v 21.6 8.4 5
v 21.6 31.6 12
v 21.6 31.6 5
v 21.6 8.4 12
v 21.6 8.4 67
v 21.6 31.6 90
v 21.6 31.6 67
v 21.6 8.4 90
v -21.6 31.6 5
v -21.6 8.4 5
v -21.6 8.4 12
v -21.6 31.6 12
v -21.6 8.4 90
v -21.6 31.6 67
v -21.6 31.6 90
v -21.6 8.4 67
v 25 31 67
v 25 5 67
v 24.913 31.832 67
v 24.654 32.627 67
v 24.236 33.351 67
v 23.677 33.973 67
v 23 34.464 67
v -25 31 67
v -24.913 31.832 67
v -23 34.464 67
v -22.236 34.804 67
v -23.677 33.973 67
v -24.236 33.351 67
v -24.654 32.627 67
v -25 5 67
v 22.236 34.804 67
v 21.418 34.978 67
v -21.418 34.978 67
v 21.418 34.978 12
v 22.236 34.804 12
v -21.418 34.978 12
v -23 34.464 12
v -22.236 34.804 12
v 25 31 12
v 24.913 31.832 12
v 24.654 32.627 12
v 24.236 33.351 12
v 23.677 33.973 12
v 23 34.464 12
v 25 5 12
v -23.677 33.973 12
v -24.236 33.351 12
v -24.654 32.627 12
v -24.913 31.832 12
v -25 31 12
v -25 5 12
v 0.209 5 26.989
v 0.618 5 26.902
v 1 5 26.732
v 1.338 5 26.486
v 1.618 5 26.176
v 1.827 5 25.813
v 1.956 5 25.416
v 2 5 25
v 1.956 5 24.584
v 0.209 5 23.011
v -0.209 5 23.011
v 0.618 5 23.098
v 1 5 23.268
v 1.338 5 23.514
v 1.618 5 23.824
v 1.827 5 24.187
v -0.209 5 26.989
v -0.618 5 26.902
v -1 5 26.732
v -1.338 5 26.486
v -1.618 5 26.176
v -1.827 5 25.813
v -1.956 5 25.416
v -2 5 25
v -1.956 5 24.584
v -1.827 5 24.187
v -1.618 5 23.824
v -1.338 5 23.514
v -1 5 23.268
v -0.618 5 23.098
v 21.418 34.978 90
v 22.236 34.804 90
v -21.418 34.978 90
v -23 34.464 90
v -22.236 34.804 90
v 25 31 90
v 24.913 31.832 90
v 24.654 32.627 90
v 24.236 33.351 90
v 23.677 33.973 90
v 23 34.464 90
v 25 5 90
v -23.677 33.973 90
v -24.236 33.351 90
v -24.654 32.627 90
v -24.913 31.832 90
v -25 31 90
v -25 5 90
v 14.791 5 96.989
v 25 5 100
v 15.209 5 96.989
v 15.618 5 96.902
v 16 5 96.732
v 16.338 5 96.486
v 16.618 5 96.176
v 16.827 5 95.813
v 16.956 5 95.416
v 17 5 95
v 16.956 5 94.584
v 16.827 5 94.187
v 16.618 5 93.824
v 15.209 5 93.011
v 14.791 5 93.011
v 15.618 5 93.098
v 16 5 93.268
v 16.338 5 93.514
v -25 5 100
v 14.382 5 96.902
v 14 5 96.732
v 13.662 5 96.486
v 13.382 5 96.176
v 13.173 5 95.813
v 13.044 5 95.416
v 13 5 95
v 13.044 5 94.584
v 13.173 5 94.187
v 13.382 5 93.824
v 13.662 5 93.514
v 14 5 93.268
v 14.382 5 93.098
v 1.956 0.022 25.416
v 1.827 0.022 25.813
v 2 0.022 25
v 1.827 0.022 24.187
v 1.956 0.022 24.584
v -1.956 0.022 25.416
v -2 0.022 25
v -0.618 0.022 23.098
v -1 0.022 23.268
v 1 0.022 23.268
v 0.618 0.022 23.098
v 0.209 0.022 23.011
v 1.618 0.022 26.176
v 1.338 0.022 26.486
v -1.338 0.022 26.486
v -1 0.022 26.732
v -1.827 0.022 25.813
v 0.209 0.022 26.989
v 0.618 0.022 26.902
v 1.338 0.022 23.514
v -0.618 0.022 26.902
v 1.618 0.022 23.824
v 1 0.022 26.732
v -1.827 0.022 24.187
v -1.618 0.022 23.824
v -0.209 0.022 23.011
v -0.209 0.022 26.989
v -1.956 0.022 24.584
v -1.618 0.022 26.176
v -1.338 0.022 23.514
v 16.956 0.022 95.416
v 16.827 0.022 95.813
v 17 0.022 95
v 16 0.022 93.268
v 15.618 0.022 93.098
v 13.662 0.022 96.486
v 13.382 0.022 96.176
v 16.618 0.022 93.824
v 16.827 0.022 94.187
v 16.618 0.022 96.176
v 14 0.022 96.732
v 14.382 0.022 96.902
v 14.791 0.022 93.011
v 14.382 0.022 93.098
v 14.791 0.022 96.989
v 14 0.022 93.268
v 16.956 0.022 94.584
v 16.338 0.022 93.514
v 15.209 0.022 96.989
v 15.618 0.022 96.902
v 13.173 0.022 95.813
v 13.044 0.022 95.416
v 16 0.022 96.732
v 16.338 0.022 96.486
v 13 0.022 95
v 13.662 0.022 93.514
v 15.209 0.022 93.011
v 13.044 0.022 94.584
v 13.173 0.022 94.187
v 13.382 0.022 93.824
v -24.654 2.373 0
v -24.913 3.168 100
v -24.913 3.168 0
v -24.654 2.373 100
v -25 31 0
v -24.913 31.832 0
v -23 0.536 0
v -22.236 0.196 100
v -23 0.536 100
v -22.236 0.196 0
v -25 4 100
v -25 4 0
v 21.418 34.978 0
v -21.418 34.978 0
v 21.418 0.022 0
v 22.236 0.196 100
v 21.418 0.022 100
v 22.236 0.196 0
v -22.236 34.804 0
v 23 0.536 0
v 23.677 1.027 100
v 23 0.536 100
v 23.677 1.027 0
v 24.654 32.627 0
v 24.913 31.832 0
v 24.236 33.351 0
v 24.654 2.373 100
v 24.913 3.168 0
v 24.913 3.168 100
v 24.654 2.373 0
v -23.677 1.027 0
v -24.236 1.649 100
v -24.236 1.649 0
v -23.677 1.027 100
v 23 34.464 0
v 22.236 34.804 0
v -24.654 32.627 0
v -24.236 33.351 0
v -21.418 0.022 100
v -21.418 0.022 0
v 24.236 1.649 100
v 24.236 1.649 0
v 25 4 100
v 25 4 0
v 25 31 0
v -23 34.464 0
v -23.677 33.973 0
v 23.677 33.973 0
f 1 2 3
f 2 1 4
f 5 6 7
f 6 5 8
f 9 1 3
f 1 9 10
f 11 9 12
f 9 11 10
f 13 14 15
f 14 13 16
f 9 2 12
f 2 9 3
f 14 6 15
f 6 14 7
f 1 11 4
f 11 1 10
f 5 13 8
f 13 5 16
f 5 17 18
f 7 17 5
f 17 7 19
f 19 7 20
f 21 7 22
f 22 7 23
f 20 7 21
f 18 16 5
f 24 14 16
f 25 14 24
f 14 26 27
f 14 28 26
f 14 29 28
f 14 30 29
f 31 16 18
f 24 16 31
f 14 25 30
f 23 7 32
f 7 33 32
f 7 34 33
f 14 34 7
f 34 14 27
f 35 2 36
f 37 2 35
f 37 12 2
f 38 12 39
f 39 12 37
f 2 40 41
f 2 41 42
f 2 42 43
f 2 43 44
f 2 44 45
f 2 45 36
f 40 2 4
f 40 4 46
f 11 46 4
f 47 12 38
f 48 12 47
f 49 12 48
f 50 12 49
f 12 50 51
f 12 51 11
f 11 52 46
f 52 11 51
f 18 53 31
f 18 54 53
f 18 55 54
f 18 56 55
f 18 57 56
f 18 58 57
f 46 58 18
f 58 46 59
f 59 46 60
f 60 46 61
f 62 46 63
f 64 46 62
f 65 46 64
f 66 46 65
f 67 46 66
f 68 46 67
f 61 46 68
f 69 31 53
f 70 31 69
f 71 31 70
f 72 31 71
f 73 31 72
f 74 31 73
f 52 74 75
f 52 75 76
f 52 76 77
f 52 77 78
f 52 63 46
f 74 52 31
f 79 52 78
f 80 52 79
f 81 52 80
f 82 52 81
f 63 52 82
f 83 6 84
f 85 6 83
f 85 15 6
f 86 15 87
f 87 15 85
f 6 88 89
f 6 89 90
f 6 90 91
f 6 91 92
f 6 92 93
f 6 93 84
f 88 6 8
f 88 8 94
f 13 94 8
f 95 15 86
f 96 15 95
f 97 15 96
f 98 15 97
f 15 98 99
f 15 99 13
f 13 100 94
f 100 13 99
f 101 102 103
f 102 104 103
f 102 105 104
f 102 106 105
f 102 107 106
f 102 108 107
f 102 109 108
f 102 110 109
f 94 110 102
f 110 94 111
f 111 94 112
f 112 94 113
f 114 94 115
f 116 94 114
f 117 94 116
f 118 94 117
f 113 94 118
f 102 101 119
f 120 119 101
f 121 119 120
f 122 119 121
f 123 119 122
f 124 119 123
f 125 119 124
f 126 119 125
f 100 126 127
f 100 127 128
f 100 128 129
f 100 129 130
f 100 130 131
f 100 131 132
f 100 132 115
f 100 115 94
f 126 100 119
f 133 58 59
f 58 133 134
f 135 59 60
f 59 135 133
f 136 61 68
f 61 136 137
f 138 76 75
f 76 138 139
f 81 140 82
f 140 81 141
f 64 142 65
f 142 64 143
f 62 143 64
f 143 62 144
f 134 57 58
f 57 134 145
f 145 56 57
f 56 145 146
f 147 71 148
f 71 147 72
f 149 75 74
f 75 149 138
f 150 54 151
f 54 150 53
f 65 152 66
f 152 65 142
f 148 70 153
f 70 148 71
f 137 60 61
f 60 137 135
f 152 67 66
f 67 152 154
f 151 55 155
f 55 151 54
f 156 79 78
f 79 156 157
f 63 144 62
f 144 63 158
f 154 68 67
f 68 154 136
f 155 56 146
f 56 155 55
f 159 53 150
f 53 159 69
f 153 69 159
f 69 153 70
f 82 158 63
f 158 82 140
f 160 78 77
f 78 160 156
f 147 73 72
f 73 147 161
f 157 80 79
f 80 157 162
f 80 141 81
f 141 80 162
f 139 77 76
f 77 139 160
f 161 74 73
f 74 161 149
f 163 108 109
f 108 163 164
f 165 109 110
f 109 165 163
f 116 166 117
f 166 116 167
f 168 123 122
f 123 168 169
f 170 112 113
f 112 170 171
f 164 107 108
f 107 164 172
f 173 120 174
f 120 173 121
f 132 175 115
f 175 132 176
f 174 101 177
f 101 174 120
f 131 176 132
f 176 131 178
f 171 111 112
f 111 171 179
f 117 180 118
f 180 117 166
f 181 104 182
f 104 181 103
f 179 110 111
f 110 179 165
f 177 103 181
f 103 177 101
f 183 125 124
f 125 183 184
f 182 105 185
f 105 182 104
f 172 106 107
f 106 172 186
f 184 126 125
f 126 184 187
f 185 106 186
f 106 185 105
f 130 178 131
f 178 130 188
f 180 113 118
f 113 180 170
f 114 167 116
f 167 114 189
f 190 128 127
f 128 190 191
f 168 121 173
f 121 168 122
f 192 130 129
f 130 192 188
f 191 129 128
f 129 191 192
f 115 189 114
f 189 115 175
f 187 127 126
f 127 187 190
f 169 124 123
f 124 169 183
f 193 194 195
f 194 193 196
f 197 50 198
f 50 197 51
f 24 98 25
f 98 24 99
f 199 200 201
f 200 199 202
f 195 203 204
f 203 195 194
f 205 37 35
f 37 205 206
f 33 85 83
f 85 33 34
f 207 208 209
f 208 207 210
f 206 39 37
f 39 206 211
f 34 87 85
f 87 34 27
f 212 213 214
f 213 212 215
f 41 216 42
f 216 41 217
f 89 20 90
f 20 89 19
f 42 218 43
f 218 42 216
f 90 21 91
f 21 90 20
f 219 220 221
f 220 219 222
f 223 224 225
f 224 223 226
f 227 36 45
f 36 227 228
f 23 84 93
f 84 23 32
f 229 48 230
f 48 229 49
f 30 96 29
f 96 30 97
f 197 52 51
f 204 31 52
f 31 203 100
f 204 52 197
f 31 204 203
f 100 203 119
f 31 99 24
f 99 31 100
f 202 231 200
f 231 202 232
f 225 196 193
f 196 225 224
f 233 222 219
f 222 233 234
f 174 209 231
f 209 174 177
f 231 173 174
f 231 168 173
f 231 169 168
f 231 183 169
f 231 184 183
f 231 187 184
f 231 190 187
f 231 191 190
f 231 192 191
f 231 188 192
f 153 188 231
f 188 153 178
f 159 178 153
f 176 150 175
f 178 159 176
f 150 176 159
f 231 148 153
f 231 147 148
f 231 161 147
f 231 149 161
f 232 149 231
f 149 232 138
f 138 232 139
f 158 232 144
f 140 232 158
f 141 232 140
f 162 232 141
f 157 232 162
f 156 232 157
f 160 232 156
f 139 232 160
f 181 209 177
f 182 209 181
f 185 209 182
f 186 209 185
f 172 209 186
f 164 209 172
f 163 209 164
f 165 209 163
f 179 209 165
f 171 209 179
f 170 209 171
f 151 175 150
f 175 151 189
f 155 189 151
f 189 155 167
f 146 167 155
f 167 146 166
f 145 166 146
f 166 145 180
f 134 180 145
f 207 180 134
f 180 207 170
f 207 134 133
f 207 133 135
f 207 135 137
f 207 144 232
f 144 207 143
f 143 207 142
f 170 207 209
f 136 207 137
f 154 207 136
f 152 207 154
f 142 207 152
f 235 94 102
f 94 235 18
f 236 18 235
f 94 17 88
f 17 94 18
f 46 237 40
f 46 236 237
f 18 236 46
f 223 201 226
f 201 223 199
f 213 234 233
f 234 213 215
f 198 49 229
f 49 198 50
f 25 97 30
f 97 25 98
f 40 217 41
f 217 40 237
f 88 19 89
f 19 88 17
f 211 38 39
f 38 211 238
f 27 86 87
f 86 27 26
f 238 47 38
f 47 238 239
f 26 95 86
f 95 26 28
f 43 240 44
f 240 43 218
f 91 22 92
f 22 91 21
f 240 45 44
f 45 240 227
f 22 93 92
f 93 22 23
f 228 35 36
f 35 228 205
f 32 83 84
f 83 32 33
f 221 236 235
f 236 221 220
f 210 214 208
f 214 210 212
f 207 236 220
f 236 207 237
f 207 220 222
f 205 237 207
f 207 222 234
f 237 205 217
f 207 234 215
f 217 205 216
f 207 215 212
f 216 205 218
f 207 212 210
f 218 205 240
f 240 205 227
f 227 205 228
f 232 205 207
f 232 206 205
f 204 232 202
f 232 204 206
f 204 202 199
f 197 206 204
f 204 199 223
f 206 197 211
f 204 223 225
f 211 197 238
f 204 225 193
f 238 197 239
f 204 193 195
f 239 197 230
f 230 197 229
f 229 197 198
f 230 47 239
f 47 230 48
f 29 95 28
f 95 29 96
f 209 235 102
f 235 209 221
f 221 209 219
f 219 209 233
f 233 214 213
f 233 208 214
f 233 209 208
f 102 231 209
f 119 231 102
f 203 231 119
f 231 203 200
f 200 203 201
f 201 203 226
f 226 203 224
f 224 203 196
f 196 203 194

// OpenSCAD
module rounded_v_edges_cube(size=[20,20,20], r=4){
	linear_extrude(height=size[2]){		
		hull(){
			for(x_sign = [-1, 1]){
				for(y_sign = [-1, 1]){
		 			translate([
						x_sign * size[0] / 2 - x_sign * r, 
						y_sign * size[1] / 2 - y_sign * r,
						0 ])
							circle(r=r, $fn=30);
				}
			}
		}	
	}
}

module bracket()
{

	xtra_spc = 1.6;

		difference() {
			union() {
				
				translate([0, 35/2, 0])				
					rounded_v_edges_cube([50, 35, 100]);
				//translate([-25, 0, 0])				
					//cube([50, 35, 100]);

			//	translate([0, 0, 100])				
				//	%cylinder(r=20, h=50, $fn=30); 
			}
		   union() {
				
				translate([-20-xtra_spc, 10-xtra_spc, 5])
					cube([40+xtra_spc*2, 20+xtra_spc*2, 90]);
				translate([-40, 5, 12])
					cube([80, 40, 55]);
				translate([-40, 5, 90])
					cube([80, 40, 55]);
				translate([0, 8, 25]){				
					rotate([90,0,0]){
						cylinder(r=2, h=10, $fn=30); //6 gauge screw = 3.6 clearence hole
					}
				}
				translate([15, 8, 95]){				
					rotate([90,0,0]){
						cylinder(r=2, h=10, $fn=30); //6 gauge screw = 3.6 clearence hole
					}
				}

			}
		}
}


bracket();

//translate([0, -30, 0])
//	rounded_v_edges_cube();
